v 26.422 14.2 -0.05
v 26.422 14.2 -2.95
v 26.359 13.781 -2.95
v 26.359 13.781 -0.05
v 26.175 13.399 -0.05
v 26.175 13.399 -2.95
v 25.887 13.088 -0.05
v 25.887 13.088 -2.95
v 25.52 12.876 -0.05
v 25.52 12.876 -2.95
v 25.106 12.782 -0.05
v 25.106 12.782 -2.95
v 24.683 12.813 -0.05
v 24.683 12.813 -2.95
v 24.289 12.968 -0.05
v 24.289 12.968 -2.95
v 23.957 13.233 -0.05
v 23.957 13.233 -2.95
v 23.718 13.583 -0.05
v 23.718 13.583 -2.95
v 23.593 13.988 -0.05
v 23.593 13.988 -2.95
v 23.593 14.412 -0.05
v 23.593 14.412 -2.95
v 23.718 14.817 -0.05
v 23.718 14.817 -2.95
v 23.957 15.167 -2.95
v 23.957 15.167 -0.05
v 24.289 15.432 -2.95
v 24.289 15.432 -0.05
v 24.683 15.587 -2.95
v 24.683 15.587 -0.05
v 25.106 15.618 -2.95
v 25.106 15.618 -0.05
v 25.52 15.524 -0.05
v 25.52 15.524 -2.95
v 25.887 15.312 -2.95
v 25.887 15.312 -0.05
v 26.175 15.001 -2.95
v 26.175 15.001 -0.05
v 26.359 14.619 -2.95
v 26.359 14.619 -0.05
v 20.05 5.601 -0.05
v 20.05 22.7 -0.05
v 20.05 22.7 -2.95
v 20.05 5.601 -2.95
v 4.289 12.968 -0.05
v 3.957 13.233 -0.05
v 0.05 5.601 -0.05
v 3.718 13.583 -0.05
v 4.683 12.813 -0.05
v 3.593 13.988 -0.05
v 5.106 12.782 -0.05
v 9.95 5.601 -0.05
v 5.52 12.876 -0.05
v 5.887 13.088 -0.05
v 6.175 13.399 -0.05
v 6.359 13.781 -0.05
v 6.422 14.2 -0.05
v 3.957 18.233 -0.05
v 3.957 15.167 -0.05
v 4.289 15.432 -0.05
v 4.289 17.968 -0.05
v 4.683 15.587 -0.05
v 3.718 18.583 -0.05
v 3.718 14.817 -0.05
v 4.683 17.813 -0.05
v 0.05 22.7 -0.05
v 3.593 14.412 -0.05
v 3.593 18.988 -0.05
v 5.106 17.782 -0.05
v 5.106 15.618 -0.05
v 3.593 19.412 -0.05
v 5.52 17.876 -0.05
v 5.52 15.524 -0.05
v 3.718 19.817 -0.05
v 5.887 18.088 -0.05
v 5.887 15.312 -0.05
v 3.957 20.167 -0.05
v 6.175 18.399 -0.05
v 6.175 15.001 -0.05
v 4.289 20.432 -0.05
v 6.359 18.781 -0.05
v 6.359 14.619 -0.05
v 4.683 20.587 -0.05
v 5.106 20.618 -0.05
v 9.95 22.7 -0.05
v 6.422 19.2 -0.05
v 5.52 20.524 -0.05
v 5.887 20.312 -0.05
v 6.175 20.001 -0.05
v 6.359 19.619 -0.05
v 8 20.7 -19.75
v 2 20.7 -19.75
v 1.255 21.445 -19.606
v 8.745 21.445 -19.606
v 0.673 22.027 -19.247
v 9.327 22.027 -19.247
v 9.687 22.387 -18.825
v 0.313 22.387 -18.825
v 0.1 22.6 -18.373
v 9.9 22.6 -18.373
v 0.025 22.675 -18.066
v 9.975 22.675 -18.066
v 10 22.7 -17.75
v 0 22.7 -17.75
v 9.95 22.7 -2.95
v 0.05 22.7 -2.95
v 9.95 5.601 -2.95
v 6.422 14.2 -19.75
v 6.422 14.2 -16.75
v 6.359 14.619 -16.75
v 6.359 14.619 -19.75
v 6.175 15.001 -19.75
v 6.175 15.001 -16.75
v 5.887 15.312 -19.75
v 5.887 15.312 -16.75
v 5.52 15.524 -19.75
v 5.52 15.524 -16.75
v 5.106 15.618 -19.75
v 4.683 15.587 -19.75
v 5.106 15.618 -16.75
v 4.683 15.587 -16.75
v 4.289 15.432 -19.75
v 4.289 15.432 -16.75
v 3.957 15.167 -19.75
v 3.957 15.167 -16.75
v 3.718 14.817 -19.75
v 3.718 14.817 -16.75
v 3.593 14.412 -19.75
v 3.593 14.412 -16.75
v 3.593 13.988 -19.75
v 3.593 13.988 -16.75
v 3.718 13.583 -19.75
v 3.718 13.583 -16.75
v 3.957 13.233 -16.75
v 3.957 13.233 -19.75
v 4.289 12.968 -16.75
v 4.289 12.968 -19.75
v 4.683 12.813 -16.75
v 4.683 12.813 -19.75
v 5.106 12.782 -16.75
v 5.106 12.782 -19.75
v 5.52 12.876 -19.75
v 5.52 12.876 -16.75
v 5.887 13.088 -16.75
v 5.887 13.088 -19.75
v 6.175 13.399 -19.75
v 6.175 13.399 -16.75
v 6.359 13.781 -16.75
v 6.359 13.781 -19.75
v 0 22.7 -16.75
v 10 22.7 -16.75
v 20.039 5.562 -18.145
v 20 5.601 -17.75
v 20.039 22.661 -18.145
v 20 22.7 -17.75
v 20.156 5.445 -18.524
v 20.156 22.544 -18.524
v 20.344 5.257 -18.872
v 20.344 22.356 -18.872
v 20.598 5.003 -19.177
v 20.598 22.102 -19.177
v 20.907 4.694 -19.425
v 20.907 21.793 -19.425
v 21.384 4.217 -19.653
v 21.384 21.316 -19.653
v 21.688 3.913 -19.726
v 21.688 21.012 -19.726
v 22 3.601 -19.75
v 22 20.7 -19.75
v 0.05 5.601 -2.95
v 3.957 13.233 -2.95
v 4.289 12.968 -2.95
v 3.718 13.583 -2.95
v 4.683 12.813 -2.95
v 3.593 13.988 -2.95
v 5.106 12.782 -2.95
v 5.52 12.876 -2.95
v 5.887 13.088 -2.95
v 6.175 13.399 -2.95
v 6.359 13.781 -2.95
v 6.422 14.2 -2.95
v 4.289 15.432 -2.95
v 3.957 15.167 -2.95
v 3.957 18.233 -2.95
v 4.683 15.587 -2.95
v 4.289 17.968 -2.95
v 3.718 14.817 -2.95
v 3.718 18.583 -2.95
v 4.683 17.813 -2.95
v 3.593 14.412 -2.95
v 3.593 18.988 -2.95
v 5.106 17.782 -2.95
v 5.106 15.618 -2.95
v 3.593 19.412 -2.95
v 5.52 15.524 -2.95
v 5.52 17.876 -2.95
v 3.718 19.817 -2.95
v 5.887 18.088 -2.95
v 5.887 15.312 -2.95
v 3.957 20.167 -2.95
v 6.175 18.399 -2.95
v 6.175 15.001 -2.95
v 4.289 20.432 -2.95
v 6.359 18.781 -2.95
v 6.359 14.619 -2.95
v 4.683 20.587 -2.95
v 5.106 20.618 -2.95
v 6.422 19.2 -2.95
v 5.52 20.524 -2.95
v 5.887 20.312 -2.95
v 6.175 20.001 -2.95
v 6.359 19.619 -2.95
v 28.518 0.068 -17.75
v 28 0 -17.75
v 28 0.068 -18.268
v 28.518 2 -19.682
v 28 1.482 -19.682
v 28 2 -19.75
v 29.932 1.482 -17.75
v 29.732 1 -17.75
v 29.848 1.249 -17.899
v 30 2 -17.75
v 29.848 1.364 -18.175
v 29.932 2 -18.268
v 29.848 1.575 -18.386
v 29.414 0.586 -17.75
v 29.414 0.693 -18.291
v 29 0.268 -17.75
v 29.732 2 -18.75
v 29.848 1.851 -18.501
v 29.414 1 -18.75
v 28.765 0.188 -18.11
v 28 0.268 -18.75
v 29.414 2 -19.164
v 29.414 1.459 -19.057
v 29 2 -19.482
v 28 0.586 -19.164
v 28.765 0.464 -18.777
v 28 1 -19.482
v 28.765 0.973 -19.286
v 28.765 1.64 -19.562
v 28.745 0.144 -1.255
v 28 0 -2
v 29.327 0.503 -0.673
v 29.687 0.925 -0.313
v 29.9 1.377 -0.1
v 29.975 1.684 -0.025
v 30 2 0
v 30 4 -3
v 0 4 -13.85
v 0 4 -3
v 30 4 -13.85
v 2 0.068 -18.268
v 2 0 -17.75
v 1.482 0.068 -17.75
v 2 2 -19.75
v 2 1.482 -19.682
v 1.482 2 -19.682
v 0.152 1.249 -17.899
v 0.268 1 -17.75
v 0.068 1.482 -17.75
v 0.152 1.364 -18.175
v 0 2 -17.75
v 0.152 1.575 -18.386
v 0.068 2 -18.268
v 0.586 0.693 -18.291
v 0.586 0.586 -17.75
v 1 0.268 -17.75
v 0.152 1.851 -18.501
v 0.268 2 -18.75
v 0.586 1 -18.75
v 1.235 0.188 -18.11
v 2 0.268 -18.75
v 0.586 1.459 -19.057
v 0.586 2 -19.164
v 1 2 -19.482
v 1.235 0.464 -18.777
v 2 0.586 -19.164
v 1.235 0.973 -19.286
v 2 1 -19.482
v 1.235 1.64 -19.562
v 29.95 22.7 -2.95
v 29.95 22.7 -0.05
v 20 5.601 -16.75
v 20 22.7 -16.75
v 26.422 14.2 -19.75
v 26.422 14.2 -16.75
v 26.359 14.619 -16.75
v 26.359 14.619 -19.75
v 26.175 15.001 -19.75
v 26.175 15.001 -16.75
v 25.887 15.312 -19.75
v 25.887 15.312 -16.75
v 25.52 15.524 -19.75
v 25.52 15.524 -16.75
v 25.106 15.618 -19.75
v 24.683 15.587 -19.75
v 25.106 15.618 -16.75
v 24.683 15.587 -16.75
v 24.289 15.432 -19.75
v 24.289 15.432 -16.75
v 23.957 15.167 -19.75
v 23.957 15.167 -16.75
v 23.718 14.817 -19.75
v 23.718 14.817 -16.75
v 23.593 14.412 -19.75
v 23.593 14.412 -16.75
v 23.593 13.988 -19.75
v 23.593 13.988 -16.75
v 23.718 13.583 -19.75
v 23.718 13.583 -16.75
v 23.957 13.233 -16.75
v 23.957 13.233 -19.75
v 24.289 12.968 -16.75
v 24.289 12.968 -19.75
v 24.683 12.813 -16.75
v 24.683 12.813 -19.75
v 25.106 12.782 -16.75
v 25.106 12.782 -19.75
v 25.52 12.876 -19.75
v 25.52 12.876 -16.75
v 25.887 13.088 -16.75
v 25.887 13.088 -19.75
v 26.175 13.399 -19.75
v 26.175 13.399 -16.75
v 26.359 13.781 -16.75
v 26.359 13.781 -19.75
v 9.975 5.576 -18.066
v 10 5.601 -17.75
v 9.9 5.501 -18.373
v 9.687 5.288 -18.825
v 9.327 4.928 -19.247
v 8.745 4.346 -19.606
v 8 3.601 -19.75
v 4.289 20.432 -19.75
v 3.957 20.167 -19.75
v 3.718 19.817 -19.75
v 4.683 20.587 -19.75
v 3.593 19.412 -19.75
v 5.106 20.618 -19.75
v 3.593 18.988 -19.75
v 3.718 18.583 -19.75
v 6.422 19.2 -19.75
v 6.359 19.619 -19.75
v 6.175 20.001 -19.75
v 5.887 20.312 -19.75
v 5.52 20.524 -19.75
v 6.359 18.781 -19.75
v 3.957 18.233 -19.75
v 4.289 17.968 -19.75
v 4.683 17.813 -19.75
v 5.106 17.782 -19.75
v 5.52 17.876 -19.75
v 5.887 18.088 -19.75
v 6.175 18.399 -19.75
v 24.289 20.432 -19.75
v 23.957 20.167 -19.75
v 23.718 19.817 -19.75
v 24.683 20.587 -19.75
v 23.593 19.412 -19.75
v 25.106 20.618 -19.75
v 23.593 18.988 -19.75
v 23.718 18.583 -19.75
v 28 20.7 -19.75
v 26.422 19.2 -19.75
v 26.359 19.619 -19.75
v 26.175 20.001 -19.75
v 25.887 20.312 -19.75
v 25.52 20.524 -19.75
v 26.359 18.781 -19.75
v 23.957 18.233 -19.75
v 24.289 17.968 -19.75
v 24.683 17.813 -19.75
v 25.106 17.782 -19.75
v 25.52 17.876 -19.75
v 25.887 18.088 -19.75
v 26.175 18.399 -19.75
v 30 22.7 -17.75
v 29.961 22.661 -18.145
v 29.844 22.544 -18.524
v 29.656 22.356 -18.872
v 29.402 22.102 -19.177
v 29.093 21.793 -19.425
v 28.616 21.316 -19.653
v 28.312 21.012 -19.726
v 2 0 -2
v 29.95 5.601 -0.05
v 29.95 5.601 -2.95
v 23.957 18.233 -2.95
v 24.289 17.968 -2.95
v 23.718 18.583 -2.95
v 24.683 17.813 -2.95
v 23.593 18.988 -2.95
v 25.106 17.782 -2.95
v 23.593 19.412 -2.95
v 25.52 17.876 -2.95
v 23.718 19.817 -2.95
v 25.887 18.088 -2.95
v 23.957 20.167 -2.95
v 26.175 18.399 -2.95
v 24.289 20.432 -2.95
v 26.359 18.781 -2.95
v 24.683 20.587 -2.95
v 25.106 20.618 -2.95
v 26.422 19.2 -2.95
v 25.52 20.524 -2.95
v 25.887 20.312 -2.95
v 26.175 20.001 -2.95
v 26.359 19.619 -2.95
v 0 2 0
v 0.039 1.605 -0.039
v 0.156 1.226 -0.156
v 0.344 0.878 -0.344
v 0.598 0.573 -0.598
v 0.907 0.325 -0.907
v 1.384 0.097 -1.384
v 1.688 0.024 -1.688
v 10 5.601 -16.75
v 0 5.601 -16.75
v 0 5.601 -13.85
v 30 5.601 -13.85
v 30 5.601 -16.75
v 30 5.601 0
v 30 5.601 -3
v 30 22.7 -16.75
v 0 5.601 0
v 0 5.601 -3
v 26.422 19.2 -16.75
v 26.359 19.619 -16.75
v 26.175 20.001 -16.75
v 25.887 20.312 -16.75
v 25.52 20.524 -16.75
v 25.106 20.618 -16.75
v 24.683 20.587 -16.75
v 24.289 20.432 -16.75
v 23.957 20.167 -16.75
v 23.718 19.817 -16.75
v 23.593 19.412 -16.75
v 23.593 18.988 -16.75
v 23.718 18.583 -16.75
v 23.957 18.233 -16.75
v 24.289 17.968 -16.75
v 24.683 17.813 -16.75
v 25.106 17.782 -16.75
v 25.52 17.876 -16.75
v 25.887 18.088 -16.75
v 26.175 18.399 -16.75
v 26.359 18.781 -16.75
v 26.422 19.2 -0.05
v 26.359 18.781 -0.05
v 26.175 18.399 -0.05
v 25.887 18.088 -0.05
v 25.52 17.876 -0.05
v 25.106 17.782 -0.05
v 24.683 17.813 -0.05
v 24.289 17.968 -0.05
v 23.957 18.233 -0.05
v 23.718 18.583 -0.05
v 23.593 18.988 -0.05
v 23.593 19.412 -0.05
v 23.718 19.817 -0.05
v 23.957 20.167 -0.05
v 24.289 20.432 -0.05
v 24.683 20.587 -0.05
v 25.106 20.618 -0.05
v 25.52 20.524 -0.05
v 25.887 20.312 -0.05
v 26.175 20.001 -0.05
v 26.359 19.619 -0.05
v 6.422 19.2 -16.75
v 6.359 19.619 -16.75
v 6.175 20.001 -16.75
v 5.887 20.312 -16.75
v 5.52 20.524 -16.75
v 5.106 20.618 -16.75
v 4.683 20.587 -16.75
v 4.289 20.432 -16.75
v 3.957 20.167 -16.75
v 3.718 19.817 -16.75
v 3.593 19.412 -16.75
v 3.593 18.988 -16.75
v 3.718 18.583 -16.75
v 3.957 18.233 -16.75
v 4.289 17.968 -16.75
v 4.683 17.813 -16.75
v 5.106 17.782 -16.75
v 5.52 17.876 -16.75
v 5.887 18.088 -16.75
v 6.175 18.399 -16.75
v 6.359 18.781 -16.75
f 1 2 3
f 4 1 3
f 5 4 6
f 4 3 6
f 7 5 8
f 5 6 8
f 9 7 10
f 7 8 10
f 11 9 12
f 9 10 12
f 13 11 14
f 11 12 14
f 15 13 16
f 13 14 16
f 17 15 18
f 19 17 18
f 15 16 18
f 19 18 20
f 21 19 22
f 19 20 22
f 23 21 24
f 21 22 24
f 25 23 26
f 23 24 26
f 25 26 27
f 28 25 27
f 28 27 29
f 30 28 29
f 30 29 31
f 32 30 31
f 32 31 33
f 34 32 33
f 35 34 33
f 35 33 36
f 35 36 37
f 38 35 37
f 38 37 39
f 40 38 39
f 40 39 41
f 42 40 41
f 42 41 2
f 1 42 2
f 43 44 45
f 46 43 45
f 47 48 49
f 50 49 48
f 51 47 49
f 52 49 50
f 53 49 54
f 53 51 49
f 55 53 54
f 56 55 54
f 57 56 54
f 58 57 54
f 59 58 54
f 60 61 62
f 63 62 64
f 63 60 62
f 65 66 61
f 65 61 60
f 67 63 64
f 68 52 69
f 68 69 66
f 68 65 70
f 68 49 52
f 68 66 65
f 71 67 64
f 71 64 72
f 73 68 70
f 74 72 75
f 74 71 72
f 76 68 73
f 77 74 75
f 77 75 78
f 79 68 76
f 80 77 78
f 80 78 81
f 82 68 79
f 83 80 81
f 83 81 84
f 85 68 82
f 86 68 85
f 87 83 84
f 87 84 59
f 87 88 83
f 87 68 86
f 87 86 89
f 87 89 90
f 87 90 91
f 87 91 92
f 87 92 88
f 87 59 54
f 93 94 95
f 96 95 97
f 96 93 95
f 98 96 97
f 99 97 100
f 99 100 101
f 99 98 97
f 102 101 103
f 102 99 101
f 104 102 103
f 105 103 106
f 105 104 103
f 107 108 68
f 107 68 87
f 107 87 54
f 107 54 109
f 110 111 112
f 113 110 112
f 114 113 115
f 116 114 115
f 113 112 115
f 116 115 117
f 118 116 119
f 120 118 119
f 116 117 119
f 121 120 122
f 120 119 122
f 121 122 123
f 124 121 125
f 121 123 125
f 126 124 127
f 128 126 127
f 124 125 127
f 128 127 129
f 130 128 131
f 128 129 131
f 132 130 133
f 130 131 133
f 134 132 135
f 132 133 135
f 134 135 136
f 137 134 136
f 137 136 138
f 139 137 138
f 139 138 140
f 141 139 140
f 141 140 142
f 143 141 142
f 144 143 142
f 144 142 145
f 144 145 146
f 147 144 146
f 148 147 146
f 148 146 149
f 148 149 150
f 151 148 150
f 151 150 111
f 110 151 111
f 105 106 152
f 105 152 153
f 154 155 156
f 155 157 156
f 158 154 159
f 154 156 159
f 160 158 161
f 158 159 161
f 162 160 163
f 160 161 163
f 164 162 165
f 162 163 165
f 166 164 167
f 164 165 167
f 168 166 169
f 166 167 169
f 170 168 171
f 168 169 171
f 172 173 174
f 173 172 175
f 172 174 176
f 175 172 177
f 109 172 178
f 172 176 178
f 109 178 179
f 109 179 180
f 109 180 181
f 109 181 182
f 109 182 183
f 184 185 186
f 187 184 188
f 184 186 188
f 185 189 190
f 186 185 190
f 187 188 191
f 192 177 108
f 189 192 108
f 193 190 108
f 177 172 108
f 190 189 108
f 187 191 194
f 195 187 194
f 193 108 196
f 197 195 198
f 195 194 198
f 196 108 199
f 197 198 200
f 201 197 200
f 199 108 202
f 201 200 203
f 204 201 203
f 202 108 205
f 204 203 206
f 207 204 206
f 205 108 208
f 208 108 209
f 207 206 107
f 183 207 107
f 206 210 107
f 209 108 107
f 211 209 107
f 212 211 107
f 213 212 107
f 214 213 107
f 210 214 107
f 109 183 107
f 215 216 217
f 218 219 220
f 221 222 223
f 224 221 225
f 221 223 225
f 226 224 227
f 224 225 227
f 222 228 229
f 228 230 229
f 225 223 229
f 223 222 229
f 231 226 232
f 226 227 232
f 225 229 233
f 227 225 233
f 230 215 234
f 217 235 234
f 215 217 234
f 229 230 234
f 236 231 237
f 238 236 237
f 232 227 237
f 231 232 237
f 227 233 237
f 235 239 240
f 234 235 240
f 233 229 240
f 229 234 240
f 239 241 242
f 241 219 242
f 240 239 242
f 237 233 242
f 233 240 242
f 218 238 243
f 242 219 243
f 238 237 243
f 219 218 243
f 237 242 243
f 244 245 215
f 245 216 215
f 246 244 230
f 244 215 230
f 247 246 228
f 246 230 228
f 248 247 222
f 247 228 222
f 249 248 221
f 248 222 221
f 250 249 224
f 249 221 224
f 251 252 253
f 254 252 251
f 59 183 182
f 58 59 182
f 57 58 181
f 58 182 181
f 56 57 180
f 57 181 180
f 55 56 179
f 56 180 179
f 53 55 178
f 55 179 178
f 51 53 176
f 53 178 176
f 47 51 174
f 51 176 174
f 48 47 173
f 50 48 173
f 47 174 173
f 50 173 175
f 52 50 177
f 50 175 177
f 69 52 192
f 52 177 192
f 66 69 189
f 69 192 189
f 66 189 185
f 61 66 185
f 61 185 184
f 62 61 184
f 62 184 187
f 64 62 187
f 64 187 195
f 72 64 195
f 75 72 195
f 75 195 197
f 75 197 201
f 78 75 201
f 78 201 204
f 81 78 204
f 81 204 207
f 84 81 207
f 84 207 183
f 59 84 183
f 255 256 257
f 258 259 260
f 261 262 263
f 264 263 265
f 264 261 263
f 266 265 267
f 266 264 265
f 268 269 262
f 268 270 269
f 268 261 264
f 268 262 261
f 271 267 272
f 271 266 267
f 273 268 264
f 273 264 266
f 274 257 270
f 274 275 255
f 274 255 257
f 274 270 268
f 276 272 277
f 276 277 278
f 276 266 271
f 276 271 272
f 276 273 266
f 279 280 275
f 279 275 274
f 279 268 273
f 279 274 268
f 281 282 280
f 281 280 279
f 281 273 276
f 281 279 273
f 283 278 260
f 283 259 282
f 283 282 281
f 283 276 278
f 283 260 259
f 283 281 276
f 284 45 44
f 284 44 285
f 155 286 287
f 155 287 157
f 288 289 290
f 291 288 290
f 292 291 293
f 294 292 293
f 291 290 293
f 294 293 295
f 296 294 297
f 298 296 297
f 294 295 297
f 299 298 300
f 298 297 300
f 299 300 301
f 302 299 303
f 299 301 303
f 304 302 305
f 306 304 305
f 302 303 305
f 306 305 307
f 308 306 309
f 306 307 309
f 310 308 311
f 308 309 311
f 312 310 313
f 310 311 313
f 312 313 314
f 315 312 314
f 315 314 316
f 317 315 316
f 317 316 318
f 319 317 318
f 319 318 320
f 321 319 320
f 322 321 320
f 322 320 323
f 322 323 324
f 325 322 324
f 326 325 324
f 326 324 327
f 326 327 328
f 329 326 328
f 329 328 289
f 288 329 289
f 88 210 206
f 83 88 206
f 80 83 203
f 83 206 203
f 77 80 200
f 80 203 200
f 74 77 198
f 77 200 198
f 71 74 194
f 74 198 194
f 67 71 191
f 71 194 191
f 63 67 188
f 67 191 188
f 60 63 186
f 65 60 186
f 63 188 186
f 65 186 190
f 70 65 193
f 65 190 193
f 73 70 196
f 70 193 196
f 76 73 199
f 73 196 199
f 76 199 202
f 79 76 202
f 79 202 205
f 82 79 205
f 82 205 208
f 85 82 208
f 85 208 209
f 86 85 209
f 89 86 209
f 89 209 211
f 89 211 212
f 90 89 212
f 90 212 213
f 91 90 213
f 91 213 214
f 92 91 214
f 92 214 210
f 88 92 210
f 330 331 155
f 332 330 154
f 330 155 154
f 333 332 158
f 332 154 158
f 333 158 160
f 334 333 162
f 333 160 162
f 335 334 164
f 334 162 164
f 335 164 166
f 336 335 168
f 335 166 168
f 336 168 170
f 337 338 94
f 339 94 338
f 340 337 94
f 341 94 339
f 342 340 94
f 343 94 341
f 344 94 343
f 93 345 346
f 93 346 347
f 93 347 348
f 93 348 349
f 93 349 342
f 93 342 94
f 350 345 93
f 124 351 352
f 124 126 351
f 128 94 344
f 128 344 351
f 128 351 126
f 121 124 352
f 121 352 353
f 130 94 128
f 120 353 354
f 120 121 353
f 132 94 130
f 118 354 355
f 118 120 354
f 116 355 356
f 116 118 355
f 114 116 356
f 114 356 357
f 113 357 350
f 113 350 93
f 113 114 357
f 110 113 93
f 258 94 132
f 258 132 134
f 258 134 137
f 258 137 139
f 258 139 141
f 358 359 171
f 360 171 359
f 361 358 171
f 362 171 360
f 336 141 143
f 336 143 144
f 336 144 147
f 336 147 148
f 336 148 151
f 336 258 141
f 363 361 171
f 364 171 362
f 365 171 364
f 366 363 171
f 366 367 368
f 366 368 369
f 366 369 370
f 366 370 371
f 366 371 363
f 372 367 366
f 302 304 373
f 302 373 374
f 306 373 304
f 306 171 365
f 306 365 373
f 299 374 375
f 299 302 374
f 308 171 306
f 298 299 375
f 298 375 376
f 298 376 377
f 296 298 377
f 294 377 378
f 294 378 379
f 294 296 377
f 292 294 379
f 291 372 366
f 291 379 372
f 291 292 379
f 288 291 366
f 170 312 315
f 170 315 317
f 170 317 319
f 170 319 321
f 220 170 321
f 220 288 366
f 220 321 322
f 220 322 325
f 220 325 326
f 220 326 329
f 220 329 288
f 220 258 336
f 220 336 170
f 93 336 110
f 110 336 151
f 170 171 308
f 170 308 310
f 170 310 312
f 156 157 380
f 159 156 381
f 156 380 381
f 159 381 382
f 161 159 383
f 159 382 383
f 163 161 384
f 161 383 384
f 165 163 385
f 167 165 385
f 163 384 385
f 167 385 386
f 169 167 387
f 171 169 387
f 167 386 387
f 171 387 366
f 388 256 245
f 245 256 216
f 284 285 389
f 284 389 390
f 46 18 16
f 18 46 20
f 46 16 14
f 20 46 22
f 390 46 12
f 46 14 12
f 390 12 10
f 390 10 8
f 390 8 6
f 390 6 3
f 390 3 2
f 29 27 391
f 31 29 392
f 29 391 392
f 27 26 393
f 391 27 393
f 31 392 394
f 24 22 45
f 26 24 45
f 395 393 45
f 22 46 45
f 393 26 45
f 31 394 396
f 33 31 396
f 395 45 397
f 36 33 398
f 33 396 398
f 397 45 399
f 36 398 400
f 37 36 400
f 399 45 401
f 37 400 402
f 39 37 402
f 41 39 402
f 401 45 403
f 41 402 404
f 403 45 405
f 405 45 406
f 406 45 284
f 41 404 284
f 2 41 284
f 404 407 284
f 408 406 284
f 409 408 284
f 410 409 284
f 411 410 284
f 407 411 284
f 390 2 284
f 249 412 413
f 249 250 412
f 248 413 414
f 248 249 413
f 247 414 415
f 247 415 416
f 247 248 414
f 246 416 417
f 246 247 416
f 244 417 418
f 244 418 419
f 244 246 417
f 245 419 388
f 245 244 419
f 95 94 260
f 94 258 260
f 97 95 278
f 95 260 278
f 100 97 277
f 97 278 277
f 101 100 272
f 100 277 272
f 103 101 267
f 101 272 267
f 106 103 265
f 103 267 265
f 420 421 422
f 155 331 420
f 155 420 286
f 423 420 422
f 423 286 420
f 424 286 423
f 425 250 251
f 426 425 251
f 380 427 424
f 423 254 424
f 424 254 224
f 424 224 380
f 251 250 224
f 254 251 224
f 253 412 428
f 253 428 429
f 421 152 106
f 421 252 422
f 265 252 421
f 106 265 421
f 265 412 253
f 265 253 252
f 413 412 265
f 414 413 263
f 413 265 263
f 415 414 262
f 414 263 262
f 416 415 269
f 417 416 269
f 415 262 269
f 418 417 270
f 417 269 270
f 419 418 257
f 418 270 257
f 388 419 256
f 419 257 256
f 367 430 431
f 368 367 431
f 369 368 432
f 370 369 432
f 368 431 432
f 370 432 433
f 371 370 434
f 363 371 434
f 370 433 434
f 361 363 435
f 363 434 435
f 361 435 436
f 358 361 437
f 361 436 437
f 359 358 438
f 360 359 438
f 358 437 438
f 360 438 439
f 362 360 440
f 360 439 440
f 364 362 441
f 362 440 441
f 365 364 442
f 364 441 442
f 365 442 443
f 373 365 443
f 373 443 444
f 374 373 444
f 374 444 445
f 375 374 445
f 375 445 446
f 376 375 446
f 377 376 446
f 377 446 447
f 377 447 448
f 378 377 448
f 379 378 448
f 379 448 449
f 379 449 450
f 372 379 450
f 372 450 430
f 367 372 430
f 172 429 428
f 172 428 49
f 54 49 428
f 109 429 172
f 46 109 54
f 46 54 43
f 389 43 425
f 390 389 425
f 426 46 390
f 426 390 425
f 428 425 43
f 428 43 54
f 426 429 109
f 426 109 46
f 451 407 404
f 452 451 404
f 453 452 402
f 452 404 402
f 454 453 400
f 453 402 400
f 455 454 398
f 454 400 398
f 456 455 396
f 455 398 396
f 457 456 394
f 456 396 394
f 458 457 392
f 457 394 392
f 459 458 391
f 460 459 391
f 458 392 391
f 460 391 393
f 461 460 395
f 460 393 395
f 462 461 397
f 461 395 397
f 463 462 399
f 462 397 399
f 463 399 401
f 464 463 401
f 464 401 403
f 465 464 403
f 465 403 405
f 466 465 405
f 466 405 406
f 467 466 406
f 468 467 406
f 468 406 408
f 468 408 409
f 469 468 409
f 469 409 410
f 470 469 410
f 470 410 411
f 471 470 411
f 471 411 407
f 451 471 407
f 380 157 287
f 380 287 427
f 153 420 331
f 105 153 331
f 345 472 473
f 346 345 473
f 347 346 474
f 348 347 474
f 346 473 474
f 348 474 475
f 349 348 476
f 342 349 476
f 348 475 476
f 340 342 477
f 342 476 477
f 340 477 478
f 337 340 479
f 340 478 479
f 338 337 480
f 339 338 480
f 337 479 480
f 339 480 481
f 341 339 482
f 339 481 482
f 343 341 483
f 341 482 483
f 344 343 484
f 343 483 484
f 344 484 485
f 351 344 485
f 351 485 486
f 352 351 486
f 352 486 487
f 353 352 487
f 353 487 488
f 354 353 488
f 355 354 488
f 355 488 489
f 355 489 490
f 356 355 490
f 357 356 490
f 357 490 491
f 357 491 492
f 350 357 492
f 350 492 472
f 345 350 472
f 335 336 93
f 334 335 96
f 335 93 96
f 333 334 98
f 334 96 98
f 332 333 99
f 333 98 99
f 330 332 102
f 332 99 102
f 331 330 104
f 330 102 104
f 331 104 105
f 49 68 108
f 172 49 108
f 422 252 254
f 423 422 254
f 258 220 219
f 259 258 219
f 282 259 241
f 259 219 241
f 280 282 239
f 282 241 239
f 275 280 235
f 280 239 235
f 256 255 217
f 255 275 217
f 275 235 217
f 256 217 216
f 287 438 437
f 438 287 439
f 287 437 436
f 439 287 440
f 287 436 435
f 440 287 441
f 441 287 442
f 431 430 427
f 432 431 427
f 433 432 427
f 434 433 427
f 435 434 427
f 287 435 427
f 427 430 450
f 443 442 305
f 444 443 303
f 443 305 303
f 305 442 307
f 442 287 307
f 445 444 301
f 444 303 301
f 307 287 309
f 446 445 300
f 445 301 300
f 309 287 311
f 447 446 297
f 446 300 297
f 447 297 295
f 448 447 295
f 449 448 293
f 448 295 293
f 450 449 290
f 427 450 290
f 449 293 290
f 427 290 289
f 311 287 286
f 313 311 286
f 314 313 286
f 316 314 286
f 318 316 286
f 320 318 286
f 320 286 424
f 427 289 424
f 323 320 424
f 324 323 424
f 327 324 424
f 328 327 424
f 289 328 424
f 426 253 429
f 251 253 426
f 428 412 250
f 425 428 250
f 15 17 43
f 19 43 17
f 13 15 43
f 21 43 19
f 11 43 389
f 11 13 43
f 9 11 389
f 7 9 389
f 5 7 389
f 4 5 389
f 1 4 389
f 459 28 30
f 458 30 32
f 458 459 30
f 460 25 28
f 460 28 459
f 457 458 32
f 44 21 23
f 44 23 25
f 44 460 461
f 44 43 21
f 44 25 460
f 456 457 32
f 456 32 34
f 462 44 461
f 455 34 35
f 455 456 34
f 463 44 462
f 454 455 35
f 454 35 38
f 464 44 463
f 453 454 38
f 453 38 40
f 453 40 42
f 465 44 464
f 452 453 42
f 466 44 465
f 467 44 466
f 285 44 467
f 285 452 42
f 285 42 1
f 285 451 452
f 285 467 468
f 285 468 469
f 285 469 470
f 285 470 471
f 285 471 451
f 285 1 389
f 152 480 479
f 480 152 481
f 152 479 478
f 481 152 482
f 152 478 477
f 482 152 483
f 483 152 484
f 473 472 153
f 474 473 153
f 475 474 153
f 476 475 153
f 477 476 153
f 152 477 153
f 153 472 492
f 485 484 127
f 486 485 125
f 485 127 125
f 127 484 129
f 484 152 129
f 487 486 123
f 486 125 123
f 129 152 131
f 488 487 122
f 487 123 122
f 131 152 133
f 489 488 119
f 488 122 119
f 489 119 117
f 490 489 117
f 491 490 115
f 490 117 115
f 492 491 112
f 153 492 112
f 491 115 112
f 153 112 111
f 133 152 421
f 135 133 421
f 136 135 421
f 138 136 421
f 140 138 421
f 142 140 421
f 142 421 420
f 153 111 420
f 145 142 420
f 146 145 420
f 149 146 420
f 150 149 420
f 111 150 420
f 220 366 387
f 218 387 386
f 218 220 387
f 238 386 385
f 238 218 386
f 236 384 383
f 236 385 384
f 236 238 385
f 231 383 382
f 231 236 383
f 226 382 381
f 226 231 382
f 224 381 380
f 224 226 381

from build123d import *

# Parameters (mm, degrees)
SKETCH1_W           = 30
SKETCH1_H           = 19.75
BOSS_EXTRUDE1_DEPTH = 4
SKETCH2_W           = 30
SKETCH2_H           = 5.9
BOSS_EXTRUDE2_DEPTH = 1.601
SKETCH3_W           = 10
SKETCH3_H           = 3
BOSS_EXTRUDE3_DEPTH = 18.7
SKETCH4_W           = 10
SKETCH4_H           = 3
BOSS_EXTRUDE4_DEPTH = 17.099
SKETCH5_W           = 10
SKETCH5_H           = 3
BOSS_EXTRUDE5_DEPTH = 1.601
FILLET1_R           = 2
CUT_EXTRUDE1_REACH  = 43.181
SKETCH6_R           = 1.4224
CUT_EXTRUDE2_REACH  = 43.181
SKETCH7_R           = 1.4224
SKETCH8_W           = 10
SKETCH8_H           = 3
SKETCH8_W_2         = 9.9
SKETCH8_H_2         = 2.9
CUT_EXTRUDE3_DEPTH  = 17.099


with BuildPart() as part:
    # Sketch1 → Boss-Extrude1 (new body)
    with BuildSketch(Plane(origin=(0, 0, 0), x_dir=(1, 0, 0), z_dir=(0, 1, 0))):
        with Locations((15, 9.875)):
            Rectangle(SKETCH1_W, SKETCH1_H)
    extrude(amount=BOSS_EXTRUDE1_DEPTH)

    # Sketch2 → Boss-Extrude2 (add)
    with BuildSketch(Plane(origin=(0, 4, 0), x_dir=(1, 0, 0), z_dir=(0, 1, 0))):
        with Locations((15, 16.8)):
            Rectangle(SKETCH2_W, SKETCH2_H)
    extrude(amount=BOSS_EXTRUDE2_DEPTH)

    # Sketch3 → Boss-Extrude3 (add)
    with BuildSketch(Plane(origin=(0, 4, 0), x_dir=(1, 0, 0), z_dir=(0, 1, 0))):
        with Locations((5, 1.5)):
            Rectangle(SKETCH3_W, SKETCH3_H)
        with Locations((25, 1.5)):
            Rectangle(SKETCH3_W, SKETCH3_H)
    extrude(amount=BOSS_EXTRUDE3_DEPTH)

    # Sketch4 → Boss-Extrude4 (add)
    with BuildSketch(Plane(origin=(0, 5.601, 0), x_dir=(1, 0, 0), z_dir=(0, 1, 0))):
        with Locations((5, 18.25)):
            Rectangle(SKETCH4_W, SKETCH4_H)
        with Locations((25, 18.25)):
            Rectangle(SKETCH4_W, SKETCH4_H)
    extrude(amount=BOSS_EXTRUDE4_DEPTH)

    # Sketch5 → Boss-Extrude5 (add)
    with BuildSketch(Plane(origin=(0, 4, 0), x_dir=(1, 0, 0), z_dir=(0, 1, 0))):
        with Locations((15, 1.5)):
            Rectangle(SKETCH5_W, SKETCH5_H)
    extrude(amount=BOSS_EXTRUDE5_DEPTH)

    # Fillet1
    fillet1_edges = [part.edges().sort_by_distance(p)[0] for p in [
        (15, 0, -19.75),
        (30, 0, -9.875),
        (15, 0, 0),
        (10, 14.1505, -19.75),
        (5, 22.7, -19.75),
        (0, 0, -9.875),
        (15, 5.601, -19.75),
        (20, 14.1505, -19.75),
        (25, 22.7, -19.75),
        (0, 11.35, -19.75),
        (30, 11.35, -19.75),
    ]]
    fillet(fillet1_edges, radius=FILLET1_R)

    # Sketch6 → Cut-Extrude1 (cut, up to next)
    with BuildSketch(Plane.XY.offset(-16.75), mode=Mode.PRIVATE) as cut_extrude1_sk1:
        with Locations((5, 19.2)):
            Circle(SKETCH6_R)
    cut_extrude1_tool1 = extrude(cut_extrude1_sk1.sketch, amount=-CUT_EXTRUDE1_REACH, mode=Mode.PRIVATE) & part.part
    # Sketch6 → Cut-Extrude1 (cut, up to next)
    with BuildSketch(Plane.XY.offset(-16.75), mode=Mode.PRIVATE) as cut_extrude1_sk2:
        with Locations((25, 19.2)):
            Circle(SKETCH6_R)
    cut_extrude1_tool2 = extrude(cut_extrude1_sk2.sketch, amount=-CUT_EXTRUDE1_REACH, mode=Mode.PRIVATE) & part.part
    # Sketch6 → Cut-Extrude1 (cut, up to next)
    with BuildSketch(Plane.XY.offset(-16.75), mode=Mode.PRIVATE) as cut_extrude1_sk3:
        with Locations((5, 14.2)):
            Circle(SKETCH6_R)
    cut_extrude1_tool3 = extrude(cut_extrude1_sk3.sketch, amount=-CUT_EXTRUDE1_REACH, mode=Mode.PRIVATE) & part.part
    # Sketch6 → Cut-Extrude1 (cut, up to next)
    with BuildSketch(Plane.XY.offset(-16.75), mode=Mode.PRIVATE) as cut_extrude1_sk4:
        with Locations((25, 14.2)):
            Circle(SKETCH6_R)
    cut_extrude1_tool4 = extrude(cut_extrude1_sk4.sketch, amount=-CUT_EXTRUDE1_REACH, mode=Mode.PRIVATE) & part.part
    add(cut_extrude1_tool1.solids().sort_by_distance((5, 19.2, -16.75))[0], mode=Mode.SUBTRACT)
    add(cut_extrude1_tool2.solids().sort_by_distance((25, 19.2, -16.75))[0], mode=Mode.SUBTRACT)
    add(cut_extrude1_tool3.solids().sort_by_distance((5, 14.2, -16.75))[0], mode=Mode.SUBTRACT)
    add(cut_extrude1_tool4.solids().sort_by_distance((25, 14.2, -16.75))[0], mode=Mode.SUBTRACT)

    # Sketch7 → Cut-Extrude2 (cut, up to next)
    with BuildSketch(Plane(origin=(0, 0, -3), x_dir=(-1, 0, 0), z_dir=(0, 0, -1)), mode=Mode.PRIVATE) as cut_extrude2_sk1:
        with Locations(Location((-25, 19.2, 0), (0, 0, 180))):
            Circle(SKETCH7_R)
    cut_extrude2_tool1 = extrude(cut_extrude2_sk1.sketch, amount=-CUT_EXTRUDE2_REACH, mode=Mode.PRIVATE) & part.part
    # Sketch7 → Cut-Extrude2 (cut, up to next)
    with BuildSketch(Plane(origin=(0, 0, -3), x_dir=(-1, 0, 0), z_dir=(0, 0, -1)), mode=Mode.PRIVATE) as cut_extrude2_sk2:
        with Locations(Location((-5, 19.2, 0), (0, 0, 180))):
            Circle(SKETCH7_R)
    cut_extrude2_tool2 = extrude(cut_extrude2_sk2.sketch, amount=-CUT_EXTRUDE2_REACH, mode=Mode.PRIVATE) & part.part
    # Sketch7 → Cut-Extrude2 (cut, up to next)
    with BuildSketch(Plane(origin=(0, 0, -3), x_dir=(-1, 0, 0), z_dir=(0, 0, -1)), mode=Mode.PRIVATE) as cut_extrude2_sk3:
        with Locations(Location((-5, 14.2, 0), (0, 0, 180))):
            Circle(SKETCH7_R)
    cut_extrude2_tool3 = extrude(cut_extrude2_sk3.sketch, amount=-CUT_EXTRUDE2_REACH, mode=Mode.PRIVATE) & part.part
    # Sketch7 → Cut-Extrude2 (cut, up to next)
    with BuildSketch(Plane(origin=(0, 0, -3), x_dir=(-1, 0, 0), z_dir=(0, 0, -1)), mode=Mode.PRIVATE) as cut_extrude2_sk4:
        with Locations(Location((-25, 14.2, 0), (0, 0, 180))):
            Circle(SKETCH7_R)
    cut_extrude2_tool4 = extrude(cut_extrude2_sk4.sketch, amount=-CUT_EXTRUDE2_REACH, mode=Mode.PRIVATE) & part.part
    add(cut_extrude2_tool1.solids().sort_by_distance((25, 19.2, -3))[0], mode=Mode.SUBTRACT)
    add(cut_extrude2_tool2.solids().sort_by_distance((5, 19.2, -3))[0], mode=Mode.SUBTRACT)
    add(cut_extrude2_tool3.solids().sort_by_distance((5, 14.2, -3))[0], mode=Mode.SUBTRACT)
    add(cut_extrude2_tool4.solids().sort_by_distance((25, 14.2, -3))[0], mode=Mode.SUBTRACT)

    # Sketch8 → Cut-Extrude3 (cut)
    # profile 1 of 2: a face of its own
    with BuildSketch(Plane(origin=(0, 22.7, 0), x_dir=(1, 0, 0), z_dir=(0, 1, 0))):
        with Locations((5, 1.5)):
            Rectangle(SKETCH8_W, SKETCH8_H)
        with Locations((5, 1.5)):
            Rectangle(SKETCH8_W_2, SKETCH8_H_2, mode=Mode.SUBTRACT)
    # profile 2 of 2: a face of its own
    with BuildSketch(Plane(origin=(0, 22.7, 0), x_dir=(1, 0, 0), z_dir=(0, 1, 0))):
        with Locations((25, 1.5)):
            Rectangle(SKETCH8_W, SKETCH8_H)
        with Locations((25, 1.5)):
            Rectangle(SKETCH8_W_2, SKETCH8_H_2, mode=Mode.SUBTRACT)
    extrude(amount=-CUT_EXTRUDE3_DEPTH, mode=Mode.SUBTRACT)


solid = part.part
